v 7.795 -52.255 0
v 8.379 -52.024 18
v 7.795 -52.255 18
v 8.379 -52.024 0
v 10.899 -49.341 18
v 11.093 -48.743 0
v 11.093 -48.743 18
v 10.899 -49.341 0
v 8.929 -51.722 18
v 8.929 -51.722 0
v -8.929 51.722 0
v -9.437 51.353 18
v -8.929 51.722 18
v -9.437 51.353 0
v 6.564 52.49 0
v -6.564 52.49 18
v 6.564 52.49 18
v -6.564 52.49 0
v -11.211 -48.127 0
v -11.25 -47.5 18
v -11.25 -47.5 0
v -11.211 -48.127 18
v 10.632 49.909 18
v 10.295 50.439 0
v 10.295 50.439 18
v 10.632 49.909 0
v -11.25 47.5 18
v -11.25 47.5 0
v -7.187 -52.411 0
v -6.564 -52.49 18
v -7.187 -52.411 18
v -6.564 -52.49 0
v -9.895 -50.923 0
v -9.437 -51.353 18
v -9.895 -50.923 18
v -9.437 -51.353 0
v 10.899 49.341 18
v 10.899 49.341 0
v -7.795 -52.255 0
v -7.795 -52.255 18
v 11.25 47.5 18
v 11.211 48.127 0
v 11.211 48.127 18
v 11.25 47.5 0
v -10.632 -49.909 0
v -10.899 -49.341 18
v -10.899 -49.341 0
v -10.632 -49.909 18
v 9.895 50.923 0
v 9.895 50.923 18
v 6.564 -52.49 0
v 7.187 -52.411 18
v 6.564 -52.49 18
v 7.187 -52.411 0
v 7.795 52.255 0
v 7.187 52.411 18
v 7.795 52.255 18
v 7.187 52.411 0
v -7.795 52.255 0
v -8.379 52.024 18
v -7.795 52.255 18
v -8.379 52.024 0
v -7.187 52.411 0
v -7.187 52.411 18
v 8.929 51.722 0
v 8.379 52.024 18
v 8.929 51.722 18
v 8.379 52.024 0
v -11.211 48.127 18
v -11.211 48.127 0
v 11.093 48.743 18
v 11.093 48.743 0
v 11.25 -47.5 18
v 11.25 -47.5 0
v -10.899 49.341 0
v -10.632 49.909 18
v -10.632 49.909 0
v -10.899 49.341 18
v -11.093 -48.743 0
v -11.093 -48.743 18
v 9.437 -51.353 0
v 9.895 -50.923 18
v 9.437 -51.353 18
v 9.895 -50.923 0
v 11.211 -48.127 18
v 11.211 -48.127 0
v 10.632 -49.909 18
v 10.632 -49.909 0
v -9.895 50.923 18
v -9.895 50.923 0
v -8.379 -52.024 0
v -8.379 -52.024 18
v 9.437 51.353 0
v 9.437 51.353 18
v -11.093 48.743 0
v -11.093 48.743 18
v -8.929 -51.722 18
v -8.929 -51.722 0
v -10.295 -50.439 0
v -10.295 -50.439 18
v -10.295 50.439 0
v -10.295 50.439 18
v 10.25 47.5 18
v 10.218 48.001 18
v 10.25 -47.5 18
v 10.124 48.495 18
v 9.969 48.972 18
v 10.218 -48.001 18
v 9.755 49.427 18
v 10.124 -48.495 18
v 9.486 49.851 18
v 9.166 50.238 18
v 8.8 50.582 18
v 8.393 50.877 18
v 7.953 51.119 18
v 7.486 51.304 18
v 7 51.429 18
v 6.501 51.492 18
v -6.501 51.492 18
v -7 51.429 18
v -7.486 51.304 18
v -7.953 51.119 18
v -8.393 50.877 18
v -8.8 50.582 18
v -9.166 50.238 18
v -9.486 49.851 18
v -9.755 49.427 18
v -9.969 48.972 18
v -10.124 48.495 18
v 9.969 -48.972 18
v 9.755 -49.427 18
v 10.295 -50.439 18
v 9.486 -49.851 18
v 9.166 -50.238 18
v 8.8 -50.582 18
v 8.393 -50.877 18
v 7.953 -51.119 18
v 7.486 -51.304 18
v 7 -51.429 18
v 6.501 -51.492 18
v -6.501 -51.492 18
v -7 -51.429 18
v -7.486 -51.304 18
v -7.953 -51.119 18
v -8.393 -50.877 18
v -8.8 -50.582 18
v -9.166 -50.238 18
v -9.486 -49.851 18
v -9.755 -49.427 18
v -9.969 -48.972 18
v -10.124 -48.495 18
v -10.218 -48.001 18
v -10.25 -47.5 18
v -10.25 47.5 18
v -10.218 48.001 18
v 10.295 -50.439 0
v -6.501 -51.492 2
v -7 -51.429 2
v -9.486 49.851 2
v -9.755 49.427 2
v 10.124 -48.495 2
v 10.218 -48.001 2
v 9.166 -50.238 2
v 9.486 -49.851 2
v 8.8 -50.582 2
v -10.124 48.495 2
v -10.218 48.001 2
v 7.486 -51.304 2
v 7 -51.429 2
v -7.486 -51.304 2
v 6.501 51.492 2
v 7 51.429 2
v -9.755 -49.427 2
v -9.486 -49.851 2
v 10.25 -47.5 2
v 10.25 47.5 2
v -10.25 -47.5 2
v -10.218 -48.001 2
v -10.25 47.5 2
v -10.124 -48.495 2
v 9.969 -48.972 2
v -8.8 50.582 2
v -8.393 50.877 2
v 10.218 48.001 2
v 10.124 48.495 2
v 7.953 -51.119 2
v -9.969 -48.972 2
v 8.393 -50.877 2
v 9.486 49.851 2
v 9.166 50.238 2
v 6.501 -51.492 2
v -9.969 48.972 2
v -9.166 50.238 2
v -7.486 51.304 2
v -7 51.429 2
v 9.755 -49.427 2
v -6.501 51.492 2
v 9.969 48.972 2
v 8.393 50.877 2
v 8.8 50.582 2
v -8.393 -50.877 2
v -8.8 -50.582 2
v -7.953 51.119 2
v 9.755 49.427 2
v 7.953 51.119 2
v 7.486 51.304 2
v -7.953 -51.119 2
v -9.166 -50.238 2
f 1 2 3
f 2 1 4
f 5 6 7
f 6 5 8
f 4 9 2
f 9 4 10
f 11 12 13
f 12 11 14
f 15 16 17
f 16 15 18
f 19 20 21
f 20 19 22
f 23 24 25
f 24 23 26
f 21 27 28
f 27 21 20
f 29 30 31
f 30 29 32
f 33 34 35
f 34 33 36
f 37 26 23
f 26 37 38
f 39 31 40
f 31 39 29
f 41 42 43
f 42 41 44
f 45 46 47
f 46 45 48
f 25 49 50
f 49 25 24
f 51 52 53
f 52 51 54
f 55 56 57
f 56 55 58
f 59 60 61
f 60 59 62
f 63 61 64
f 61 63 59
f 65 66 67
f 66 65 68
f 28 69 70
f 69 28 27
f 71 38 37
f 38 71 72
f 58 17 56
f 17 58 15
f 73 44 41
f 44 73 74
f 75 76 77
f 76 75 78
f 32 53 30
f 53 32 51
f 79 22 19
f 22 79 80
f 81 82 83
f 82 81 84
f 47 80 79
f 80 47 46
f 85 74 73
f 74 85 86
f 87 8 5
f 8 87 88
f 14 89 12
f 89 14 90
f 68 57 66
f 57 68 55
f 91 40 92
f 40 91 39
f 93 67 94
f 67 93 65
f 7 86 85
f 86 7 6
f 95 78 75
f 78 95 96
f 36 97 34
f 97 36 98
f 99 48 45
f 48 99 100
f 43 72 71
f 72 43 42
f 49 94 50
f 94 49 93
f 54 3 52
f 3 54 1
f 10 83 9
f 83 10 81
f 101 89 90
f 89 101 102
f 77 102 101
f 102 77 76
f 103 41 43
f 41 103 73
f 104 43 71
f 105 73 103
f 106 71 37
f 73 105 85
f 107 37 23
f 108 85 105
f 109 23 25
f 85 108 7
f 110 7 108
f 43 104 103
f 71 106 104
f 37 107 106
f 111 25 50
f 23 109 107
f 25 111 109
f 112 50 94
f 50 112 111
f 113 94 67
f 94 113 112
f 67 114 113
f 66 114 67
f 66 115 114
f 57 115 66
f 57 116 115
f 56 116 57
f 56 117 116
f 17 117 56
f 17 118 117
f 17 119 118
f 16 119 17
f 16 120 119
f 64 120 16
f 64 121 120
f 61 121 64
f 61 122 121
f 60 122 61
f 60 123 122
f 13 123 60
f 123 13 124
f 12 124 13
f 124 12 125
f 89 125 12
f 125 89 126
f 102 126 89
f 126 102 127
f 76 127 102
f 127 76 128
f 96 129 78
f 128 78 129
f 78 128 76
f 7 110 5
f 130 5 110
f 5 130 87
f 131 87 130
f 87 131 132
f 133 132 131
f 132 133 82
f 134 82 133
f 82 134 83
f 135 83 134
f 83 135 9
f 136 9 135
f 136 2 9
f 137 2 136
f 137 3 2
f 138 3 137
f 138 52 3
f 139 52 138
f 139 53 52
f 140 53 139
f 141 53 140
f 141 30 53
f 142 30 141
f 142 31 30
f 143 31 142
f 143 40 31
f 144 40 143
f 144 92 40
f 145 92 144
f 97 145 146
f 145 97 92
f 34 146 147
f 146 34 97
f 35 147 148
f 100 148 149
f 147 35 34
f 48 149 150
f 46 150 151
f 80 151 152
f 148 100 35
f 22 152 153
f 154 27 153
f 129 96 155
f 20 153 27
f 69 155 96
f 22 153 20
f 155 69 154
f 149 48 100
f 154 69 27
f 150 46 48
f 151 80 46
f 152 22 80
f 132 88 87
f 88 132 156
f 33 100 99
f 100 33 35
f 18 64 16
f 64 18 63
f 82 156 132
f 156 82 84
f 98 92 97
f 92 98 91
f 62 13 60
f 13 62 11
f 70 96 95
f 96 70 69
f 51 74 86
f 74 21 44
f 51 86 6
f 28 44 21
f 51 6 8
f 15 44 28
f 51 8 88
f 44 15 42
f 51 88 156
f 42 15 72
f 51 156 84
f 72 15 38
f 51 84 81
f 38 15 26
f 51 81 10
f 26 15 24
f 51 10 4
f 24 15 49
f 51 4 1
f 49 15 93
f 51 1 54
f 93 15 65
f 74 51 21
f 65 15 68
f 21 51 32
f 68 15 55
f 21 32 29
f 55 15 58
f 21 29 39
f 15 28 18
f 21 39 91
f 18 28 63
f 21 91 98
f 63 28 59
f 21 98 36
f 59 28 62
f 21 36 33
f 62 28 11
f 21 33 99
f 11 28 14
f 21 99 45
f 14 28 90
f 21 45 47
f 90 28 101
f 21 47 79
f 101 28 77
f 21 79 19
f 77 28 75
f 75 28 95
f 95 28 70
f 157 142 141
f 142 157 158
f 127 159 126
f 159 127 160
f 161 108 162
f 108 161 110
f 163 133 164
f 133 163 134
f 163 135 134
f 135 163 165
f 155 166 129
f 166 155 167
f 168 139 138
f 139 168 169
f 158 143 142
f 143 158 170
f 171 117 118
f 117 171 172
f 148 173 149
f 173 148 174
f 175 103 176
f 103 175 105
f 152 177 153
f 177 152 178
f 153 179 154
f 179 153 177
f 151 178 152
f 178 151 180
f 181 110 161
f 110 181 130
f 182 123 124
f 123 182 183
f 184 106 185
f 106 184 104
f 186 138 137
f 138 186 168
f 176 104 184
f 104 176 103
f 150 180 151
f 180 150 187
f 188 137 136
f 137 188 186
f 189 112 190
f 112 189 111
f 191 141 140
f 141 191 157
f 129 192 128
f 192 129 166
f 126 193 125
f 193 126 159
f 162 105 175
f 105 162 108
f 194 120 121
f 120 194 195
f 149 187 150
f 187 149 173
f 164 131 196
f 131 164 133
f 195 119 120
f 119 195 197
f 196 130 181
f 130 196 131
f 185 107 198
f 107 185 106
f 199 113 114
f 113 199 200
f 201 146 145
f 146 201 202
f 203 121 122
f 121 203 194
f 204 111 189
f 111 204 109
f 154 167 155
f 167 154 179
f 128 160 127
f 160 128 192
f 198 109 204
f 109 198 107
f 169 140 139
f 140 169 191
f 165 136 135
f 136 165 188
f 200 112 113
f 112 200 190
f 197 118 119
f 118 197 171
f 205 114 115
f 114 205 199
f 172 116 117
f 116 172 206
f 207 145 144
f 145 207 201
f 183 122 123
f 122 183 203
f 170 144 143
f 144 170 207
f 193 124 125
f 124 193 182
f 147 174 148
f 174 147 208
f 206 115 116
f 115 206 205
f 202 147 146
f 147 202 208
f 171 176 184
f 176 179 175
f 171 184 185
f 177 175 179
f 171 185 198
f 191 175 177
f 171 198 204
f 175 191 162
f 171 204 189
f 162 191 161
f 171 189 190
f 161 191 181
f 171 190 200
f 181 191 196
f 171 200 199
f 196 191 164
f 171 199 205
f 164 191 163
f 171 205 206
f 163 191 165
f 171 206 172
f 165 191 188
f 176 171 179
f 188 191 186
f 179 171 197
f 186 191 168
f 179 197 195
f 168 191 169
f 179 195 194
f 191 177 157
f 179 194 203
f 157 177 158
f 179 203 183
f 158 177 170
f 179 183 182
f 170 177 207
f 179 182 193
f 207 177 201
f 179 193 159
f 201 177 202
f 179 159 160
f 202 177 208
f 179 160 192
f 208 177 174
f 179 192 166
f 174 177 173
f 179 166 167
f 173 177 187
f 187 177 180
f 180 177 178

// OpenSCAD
$fn = 50;


difference() {
	union() {
		hull() {
			translate(v = [-6.2500000000, 47.5000000000, 0]) {
				cylinder(h = 18, r = 5);
			}
			translate(v = [6.2500000000, 47.5000000000, 0]) {
				cylinder(h = 18, r = 5);
			}
			translate(v = [-6.2500000000, -47.5000000000, 0]) {
				cylinder(h = 18, r = 5);
			}
			translate(v = [6.2500000000, -47.5000000000, 0]) {
				cylinder(h = 18, r = 5);
			}
		}
	}
	union() {
		translate(v = [0, 0, 2]) {
			hull() {
				translate(v = [-6.2500000000, 47.5000000000, 0]) {
					cylinder(h = 16, r = 4);
				}
				translate(v = [6.2500000000, 47.5000000000, 0]) {
					cylinder(h = 16, r = 4);
				}
				translate(v = [-6.2500000000, -47.5000000000, 0]) {
					cylinder(h = 16, r = 4);
				}
				translate(v = [6.2500000000, -47.5000000000, 0]) {
					cylinder(h = 16, r = 4);
				}
			}
		}
	}
}
